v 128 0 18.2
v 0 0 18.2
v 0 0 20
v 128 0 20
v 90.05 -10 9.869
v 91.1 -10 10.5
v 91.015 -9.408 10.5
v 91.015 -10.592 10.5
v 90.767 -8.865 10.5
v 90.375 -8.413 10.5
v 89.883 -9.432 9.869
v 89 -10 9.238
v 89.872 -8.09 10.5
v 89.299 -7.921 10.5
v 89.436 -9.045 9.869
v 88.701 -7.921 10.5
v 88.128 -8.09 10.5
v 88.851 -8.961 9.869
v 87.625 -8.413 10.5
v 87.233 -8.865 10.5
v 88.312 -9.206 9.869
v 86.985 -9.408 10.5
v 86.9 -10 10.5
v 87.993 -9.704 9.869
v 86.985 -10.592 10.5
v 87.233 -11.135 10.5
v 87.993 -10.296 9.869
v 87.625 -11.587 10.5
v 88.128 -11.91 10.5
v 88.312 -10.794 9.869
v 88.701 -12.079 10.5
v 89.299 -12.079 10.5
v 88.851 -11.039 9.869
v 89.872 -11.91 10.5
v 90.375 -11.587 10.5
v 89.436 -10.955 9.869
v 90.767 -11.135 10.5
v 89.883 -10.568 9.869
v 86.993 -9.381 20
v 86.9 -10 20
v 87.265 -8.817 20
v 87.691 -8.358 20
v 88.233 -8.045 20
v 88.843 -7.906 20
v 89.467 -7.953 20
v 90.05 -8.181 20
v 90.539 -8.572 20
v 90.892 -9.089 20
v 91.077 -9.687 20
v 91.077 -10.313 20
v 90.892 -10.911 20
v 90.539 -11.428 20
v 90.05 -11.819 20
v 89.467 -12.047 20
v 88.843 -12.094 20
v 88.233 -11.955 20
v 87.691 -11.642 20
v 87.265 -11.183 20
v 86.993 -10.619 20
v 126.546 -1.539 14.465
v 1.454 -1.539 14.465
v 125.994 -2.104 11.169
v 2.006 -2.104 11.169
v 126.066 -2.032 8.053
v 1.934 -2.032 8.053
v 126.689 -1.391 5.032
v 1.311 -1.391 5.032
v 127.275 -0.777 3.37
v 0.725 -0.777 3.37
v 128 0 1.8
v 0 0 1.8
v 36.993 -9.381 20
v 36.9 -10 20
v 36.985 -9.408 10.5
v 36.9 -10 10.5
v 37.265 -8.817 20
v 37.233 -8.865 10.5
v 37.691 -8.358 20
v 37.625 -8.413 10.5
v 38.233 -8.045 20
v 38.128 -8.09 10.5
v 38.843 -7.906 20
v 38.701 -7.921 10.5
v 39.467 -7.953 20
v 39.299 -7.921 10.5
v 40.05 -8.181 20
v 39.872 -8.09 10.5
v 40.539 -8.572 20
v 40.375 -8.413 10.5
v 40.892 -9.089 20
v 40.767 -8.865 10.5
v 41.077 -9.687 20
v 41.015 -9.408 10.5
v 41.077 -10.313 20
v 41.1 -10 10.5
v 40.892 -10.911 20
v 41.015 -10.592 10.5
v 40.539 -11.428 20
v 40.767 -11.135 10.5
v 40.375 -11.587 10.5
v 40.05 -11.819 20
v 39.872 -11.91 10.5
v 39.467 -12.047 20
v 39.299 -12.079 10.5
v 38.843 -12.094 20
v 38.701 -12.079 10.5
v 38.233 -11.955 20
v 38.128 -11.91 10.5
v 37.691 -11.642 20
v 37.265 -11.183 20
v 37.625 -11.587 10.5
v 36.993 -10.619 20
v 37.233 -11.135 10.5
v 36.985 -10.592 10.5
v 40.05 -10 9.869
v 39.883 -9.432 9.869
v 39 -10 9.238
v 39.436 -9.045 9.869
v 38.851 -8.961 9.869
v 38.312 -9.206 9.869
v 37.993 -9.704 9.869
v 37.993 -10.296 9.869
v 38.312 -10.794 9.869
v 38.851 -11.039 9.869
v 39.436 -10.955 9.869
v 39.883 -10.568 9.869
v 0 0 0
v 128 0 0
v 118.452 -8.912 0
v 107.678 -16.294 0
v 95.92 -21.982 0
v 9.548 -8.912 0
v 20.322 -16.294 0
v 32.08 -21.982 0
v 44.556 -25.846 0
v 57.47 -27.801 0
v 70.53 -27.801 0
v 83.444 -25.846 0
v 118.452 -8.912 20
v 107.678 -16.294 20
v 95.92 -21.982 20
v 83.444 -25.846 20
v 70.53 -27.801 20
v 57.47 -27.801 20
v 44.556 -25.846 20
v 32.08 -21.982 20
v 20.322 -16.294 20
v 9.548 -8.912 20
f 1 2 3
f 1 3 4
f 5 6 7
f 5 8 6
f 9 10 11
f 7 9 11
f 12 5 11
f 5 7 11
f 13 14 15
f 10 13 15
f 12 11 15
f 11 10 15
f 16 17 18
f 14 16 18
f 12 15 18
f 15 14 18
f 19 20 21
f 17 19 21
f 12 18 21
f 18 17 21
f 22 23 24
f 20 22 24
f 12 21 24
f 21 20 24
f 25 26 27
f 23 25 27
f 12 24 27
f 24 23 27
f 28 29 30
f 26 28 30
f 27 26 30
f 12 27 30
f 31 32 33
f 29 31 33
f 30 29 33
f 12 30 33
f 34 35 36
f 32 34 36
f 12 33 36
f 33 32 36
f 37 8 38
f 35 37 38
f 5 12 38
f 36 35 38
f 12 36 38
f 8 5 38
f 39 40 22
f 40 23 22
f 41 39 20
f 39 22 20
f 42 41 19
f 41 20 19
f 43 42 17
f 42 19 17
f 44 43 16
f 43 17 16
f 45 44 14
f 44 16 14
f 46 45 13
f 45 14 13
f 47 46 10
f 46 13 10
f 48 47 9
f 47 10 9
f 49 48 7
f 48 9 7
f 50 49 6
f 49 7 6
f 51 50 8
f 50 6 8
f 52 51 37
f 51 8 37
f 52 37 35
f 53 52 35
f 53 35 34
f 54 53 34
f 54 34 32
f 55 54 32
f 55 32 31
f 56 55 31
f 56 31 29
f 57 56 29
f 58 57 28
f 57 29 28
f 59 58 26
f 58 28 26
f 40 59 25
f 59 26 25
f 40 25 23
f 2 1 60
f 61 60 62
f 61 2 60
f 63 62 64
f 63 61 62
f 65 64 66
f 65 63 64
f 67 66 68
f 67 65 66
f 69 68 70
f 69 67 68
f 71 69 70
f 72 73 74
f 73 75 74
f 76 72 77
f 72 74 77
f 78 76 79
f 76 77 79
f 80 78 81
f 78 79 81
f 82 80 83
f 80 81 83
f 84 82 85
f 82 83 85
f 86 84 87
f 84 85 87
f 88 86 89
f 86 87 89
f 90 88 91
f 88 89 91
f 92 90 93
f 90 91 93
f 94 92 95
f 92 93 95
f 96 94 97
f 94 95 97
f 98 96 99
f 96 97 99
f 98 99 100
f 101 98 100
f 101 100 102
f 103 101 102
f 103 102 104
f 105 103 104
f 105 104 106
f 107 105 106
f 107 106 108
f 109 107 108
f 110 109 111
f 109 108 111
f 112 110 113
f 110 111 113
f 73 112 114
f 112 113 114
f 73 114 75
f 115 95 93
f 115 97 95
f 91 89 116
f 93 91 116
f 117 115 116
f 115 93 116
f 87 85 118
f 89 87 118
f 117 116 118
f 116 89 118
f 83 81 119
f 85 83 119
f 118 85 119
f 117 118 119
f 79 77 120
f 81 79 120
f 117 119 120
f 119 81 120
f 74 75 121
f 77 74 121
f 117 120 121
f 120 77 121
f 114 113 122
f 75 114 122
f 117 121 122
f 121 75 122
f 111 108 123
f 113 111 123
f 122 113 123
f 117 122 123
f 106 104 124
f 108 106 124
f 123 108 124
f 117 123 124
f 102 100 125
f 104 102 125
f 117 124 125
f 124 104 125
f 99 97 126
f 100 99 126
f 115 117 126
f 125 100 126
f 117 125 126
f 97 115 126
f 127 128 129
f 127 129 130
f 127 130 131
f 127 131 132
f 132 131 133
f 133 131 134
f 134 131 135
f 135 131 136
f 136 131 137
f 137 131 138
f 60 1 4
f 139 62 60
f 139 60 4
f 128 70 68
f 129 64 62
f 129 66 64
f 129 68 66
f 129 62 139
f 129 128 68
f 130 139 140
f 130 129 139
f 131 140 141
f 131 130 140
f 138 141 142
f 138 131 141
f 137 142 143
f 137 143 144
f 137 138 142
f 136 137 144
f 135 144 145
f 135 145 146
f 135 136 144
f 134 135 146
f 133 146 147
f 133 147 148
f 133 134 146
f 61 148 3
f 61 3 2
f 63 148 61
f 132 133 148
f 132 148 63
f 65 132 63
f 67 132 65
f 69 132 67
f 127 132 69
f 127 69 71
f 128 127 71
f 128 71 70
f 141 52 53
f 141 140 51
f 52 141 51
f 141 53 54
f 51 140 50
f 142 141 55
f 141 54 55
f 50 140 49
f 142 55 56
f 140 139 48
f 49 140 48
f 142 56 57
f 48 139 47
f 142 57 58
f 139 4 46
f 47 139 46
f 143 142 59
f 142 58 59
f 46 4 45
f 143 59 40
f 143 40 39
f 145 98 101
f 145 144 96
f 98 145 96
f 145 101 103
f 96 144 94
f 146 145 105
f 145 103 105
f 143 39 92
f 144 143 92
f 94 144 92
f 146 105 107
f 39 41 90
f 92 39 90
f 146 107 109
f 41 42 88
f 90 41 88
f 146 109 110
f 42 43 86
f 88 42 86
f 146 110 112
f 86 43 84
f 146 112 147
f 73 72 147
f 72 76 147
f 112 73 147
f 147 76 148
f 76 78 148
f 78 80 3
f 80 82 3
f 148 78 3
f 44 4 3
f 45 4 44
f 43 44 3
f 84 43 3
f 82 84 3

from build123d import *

# Parameters (mm, degrees)
EXTRUDE_1_DEPTH     = 20
SKETCH_2_R          = 16.745148551
CUT_EXTRUDE_1_DEPTH = 133.554049902
M5X0_82_D           = 4.2
M5X0_82_DEPTH       = 9.5
M5X0_82_TIP         = 1.2618073
M5X0_81_D           = 4.2
M5X0_81_DEPTH       = 9.5
M5X0_81_TIP         = 1.2618073


with BuildPart() as part:
    # Эскиз1 → Бобышка-Вытянуть1 (new body)
    with BuildSketch(Plane.XY):
        with BuildLine():
            Line((0, 0), (128, 0))
            ThreePointArc((128, 0), (64, -28.045964869), (0, 0))
        make_face()
    extrude(amount=EXTRUDE_1_DEPTH)

    # Эскиз2 → Вырез-Вытянуть1 (cut, through all)
    with BuildSketch(Plane(origin=(0, 0, 0), x_dir=(0, 0, -1), z_dir=(1, 0, 0))):
        with Locations((-10, 14.6)):
            Circle(SKETCH_2_R)
    extrude(amount=CUT_EXTRUDE_1_DEPTH, mode=Mode.SUBTRACT)

    # Отверстие обработанное метчиком M5x0.82
    with Locations(Plane.XY.offset(20)):
        with Locations((39, -10)):
            Hole(M5X0_82_D / 2, depth=M5X0_82_DEPTH)
            with Locations((0, 0, -(M5X0_82_DEPTH + M5X0_82_TIP / 2))):  # 118° drill point
                Cone(0, M5X0_82_D / 2, M5X0_82_TIP, mode=Mode.SUBTRACT)

    # Отверстие обработанное метчиком M5x0.81
    with Locations(Plane.XY.offset(20)):
        with Locations((89, -10)):
            Hole(M5X0_81_D / 2, depth=M5X0_81_DEPTH)
            with Locations((0, 0, -(M5X0_81_DEPTH + M5X0_81_TIP / 2))):  # 118° drill point
                Cone(0, M5X0_81_D / 2, M5X0_81_TIP, mode=Mode.SUBTRACT)


solid = part.part
